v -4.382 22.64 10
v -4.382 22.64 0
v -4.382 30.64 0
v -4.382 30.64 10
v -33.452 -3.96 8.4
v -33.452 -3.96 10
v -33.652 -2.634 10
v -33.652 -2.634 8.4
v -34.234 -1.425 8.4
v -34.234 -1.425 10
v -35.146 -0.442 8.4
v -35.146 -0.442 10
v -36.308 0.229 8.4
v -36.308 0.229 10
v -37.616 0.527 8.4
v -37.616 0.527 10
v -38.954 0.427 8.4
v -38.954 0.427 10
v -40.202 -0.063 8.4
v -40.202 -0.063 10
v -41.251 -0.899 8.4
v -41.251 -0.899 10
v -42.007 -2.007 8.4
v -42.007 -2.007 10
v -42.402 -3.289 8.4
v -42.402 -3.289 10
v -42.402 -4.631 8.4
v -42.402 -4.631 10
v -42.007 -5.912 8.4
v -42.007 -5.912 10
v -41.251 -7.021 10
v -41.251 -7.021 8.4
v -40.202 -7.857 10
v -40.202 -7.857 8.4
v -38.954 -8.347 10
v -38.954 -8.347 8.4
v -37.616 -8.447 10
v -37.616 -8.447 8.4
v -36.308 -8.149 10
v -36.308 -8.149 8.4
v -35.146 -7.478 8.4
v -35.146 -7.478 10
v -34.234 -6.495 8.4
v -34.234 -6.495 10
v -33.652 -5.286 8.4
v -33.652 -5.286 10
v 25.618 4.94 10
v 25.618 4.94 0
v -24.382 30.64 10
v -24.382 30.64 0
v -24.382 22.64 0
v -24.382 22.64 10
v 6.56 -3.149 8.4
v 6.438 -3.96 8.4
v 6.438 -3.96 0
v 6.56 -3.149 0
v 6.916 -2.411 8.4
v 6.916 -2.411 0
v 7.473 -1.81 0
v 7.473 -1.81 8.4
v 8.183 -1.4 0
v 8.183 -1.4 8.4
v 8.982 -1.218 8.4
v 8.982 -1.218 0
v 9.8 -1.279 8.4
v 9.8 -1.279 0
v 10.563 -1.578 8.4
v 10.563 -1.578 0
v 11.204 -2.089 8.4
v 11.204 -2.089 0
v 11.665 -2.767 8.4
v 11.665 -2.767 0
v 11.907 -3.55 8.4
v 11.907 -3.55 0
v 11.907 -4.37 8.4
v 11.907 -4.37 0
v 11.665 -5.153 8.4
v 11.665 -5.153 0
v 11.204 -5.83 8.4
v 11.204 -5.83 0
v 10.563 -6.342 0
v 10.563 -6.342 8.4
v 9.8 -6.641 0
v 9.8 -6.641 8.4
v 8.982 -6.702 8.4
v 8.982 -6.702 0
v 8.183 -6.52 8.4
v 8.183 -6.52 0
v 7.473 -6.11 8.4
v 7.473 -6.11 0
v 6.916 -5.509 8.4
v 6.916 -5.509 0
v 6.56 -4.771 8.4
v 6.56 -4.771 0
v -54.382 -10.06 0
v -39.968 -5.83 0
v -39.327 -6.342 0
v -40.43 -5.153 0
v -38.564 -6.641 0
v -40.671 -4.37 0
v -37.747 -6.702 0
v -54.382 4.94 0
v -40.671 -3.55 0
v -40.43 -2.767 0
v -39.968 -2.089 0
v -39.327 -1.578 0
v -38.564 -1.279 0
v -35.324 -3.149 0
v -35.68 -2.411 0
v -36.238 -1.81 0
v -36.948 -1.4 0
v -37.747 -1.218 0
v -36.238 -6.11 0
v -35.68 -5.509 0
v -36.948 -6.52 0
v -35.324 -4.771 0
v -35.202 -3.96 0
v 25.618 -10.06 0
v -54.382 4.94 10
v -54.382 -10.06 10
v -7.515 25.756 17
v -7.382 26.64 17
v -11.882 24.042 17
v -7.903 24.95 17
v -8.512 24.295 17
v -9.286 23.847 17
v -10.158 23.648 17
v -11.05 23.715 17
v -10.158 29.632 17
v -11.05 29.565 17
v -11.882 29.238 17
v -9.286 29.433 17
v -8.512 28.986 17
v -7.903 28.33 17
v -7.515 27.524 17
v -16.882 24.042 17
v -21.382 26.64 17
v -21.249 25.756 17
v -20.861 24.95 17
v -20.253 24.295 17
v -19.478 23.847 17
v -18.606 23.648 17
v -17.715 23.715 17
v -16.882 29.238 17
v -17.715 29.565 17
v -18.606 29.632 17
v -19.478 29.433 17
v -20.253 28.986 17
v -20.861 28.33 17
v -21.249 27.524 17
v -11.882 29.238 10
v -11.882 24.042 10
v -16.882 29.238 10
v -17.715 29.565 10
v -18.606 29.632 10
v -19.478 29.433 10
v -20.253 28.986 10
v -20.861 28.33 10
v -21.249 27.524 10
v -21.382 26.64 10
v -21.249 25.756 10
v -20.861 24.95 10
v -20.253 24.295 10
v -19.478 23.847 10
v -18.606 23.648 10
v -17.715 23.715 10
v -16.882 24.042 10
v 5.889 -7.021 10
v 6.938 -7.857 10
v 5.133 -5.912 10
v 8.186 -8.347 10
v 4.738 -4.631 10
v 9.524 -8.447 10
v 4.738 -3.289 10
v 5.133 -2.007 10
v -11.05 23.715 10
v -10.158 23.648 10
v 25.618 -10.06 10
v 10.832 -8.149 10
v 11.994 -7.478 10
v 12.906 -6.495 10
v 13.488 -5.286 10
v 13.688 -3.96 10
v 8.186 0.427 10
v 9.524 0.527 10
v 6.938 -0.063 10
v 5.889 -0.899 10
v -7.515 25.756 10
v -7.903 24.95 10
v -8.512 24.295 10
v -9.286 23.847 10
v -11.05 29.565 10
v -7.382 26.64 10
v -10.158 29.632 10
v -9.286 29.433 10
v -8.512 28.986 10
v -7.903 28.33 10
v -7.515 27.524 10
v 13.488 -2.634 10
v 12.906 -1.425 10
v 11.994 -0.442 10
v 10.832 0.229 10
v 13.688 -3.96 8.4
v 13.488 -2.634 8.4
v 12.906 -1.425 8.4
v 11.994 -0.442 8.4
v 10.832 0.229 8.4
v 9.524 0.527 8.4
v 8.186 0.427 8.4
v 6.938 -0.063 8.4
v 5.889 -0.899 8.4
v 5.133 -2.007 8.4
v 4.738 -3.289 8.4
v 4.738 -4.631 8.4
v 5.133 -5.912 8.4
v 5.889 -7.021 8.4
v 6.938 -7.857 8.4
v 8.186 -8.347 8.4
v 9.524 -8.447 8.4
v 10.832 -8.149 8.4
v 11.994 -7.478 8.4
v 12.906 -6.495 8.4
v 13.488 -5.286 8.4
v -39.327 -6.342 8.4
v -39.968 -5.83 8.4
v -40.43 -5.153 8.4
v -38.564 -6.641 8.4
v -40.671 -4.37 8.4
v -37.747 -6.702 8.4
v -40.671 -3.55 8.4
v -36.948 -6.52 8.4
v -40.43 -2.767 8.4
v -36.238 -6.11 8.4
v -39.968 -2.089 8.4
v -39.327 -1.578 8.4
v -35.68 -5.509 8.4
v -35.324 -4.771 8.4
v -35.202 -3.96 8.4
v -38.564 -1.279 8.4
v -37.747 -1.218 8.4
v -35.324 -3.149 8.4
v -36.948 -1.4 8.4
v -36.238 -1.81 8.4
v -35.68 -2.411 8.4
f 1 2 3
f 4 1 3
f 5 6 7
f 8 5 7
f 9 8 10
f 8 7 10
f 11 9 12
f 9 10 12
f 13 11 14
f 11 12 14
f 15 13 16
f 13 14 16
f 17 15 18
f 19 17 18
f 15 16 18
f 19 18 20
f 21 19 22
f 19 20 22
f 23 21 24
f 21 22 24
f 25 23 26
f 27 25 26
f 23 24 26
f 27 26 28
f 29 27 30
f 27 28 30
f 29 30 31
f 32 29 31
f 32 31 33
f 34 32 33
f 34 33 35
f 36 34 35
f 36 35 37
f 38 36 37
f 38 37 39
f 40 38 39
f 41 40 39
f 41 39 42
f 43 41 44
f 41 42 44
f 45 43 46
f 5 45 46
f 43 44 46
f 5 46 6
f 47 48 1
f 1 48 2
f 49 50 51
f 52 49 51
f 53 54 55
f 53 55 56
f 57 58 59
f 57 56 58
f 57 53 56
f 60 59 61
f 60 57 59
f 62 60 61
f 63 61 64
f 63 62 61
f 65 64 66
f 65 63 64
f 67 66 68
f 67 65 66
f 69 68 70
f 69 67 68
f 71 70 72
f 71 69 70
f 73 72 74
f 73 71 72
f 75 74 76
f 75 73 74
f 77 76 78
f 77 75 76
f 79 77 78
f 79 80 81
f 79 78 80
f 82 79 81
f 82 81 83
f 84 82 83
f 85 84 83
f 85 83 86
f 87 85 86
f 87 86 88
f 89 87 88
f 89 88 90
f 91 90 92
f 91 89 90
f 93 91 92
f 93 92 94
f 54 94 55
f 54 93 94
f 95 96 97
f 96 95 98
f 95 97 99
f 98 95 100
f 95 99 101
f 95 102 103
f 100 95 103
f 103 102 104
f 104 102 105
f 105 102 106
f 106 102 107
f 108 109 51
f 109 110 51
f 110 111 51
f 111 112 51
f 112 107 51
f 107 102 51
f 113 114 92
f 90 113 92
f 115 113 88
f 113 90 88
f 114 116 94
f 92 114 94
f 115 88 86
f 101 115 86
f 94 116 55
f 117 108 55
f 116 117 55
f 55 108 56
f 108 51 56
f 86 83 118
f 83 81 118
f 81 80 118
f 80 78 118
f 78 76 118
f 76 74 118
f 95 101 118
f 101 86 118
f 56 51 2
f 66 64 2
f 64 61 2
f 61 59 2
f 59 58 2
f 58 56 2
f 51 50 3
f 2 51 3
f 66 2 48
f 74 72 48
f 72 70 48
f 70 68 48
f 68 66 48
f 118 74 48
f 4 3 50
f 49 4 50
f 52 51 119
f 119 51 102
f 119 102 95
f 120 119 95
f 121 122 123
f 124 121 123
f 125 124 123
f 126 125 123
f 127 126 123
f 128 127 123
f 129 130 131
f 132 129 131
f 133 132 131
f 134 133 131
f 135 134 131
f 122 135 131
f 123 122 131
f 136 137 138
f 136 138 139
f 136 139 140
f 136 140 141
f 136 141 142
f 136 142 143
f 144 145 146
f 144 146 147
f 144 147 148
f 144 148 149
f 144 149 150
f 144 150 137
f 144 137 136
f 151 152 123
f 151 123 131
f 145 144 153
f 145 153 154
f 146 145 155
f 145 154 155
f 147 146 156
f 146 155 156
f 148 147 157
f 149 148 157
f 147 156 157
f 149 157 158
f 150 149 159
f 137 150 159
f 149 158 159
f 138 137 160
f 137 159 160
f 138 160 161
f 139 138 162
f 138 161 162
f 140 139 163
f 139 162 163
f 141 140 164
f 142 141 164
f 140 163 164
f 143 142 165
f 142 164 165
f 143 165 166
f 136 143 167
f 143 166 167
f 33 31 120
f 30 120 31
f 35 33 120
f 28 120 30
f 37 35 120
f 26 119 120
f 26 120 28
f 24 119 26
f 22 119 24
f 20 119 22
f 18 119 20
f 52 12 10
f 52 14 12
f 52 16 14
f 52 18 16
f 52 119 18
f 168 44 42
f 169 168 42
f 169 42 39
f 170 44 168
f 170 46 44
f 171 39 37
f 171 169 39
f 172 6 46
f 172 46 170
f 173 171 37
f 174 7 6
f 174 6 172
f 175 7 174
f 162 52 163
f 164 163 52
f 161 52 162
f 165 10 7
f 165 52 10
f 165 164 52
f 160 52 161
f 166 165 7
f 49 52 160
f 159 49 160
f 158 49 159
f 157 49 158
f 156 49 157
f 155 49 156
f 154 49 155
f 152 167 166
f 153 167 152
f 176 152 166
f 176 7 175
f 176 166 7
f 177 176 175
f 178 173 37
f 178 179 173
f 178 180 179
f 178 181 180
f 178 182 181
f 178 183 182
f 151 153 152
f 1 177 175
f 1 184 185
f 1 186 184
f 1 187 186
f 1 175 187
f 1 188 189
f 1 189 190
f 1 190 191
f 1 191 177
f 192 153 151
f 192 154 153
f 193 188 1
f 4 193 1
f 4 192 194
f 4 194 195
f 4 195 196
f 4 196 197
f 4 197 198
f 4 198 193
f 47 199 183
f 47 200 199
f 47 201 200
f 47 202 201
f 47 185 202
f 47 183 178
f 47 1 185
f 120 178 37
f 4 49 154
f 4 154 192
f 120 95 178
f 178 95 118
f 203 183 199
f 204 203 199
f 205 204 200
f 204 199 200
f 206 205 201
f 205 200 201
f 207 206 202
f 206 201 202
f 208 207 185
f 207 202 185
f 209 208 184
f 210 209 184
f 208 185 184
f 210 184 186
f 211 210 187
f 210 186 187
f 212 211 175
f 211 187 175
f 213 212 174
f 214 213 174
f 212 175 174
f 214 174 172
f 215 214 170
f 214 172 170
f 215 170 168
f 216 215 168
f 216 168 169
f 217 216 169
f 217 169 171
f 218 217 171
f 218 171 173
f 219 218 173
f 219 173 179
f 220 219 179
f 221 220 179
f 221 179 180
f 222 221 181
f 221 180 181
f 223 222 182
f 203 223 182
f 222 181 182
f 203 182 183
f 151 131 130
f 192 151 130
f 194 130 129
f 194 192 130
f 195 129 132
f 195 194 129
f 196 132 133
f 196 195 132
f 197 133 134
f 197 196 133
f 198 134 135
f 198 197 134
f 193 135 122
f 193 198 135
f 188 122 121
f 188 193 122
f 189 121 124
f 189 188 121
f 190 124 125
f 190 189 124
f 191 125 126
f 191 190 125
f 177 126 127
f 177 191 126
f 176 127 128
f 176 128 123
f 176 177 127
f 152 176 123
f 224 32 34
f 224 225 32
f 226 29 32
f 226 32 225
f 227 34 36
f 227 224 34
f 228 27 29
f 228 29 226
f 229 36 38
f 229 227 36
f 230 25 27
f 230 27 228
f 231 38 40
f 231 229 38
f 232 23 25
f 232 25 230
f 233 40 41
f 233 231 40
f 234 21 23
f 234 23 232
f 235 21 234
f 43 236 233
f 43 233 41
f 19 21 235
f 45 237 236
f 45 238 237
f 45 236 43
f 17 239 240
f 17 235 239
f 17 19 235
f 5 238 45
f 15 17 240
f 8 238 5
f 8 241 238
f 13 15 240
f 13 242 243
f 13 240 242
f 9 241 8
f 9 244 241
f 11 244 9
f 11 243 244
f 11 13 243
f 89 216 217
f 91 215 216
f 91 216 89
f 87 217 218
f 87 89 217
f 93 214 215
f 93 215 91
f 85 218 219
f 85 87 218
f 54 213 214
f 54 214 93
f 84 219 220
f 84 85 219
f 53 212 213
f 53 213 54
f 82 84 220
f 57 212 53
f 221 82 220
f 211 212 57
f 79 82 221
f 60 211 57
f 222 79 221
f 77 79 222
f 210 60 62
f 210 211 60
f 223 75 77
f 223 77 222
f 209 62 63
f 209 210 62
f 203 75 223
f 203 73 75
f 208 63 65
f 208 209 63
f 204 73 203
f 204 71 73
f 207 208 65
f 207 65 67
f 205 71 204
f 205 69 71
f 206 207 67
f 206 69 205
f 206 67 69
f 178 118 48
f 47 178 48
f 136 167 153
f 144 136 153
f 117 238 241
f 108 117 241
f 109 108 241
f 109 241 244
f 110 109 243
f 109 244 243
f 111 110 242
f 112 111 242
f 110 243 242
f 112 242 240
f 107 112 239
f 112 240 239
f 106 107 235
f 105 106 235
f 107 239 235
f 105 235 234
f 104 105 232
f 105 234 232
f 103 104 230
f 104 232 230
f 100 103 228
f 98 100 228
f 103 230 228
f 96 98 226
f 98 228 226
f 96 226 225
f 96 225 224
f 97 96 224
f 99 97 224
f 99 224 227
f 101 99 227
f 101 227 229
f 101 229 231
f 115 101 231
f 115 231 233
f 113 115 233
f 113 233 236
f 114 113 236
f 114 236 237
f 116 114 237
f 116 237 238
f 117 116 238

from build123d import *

# Parameters (mm, degrees)
BOSS_EXTRUDE1_DEPTH = 10
SKETCH3_R           = 3
BOSS_EXTRUDE2_DEPTH = 7
SKETCH4_R           = 2.75
CUT_EXTRUDE1_DEPTH  = 64.215786076
SKETCH5_W           = 5
SKETCH5_H           = 40.7
CUT_EXTRUDE2_DEPTH  = 7
SKETCH6_R           = 4.5
CUT_EXTRUDE3_DEPTH  = 1.6


with BuildPart() as part:
    # Sketch2 → Boss-Extrude1 (new body)
    with BuildSketch(Plane.XY):
        Polygon((-24.382192178, 22.640051942), (-54.382192178, 4.940051942), (-54.382192178, -10.059948058), (25.617807822, -10.059948058), (25.617807822, 4.940051942), (-4.382192178, 22.640051942), (-4.382192178, 30.640051942), (-24.382192178, 30.640051942), align=None)
    extrude(amount=BOSS_EXTRUDE1_DEPTH)

    # Sketch3 → Boss-Extrude2 (add)
    with BuildSketch(Plane.XY.offset(10)):
        with Locations((-18.382192178, 26.640051942)):
            Circle(SKETCH3_R)
    boss_extrude2 = extrude(amount=BOSS_EXTRUDE2_DEPTH)

    # Mirror1: Boss-Extrude2 across plane
    add(boss_extrude2.mirror(Plane.ZY.offset(14.382192178)))

    # Sketch4 → Cut-Extrude1 (cut, through all)
    with BuildSketch(Plane.XY.offset(10)):
        with Locations((-37.952192178, -3.959948058)):
            Circle(SKETCH4_R)
    cut_extrude1 = extrude(amount=-CUT_EXTRUDE1_DEPTH, mode=Mode.SUBTRACT)

    # Mirror2: Cut-Extrude1 across plane
    add(cut_extrude1.mirror(Plane.ZY.offset(14.382192178)), mode=Mode.SUBTRACT)

    # Sketch5 → Cut-Extrude2 (cut)
    with BuildSketch(Plane.XY.offset(10)):
        with Locations((-14.382192178, 10.290051942)):
            Rectangle(SKETCH5_W, SKETCH5_H)
    extrude(amount=CUT_EXTRUDE2_DEPTH, mode=Mode.SUBTRACT)

    # Sketch6 → Cut-Extrude3 (cut)
    with BuildSketch(Plane.XY.offset(10)):
        with Locations((-37.952192178, -3.959948058)):
            Circle(SKETCH6_R)
        with Locations((9.187807822, -3.959948058)):
            Circle(SKETCH6_R)
    extrude(amount=-CUT_EXTRUDE3_DEPTH, mode=Mode.SUBTRACT)


solid = part.part
